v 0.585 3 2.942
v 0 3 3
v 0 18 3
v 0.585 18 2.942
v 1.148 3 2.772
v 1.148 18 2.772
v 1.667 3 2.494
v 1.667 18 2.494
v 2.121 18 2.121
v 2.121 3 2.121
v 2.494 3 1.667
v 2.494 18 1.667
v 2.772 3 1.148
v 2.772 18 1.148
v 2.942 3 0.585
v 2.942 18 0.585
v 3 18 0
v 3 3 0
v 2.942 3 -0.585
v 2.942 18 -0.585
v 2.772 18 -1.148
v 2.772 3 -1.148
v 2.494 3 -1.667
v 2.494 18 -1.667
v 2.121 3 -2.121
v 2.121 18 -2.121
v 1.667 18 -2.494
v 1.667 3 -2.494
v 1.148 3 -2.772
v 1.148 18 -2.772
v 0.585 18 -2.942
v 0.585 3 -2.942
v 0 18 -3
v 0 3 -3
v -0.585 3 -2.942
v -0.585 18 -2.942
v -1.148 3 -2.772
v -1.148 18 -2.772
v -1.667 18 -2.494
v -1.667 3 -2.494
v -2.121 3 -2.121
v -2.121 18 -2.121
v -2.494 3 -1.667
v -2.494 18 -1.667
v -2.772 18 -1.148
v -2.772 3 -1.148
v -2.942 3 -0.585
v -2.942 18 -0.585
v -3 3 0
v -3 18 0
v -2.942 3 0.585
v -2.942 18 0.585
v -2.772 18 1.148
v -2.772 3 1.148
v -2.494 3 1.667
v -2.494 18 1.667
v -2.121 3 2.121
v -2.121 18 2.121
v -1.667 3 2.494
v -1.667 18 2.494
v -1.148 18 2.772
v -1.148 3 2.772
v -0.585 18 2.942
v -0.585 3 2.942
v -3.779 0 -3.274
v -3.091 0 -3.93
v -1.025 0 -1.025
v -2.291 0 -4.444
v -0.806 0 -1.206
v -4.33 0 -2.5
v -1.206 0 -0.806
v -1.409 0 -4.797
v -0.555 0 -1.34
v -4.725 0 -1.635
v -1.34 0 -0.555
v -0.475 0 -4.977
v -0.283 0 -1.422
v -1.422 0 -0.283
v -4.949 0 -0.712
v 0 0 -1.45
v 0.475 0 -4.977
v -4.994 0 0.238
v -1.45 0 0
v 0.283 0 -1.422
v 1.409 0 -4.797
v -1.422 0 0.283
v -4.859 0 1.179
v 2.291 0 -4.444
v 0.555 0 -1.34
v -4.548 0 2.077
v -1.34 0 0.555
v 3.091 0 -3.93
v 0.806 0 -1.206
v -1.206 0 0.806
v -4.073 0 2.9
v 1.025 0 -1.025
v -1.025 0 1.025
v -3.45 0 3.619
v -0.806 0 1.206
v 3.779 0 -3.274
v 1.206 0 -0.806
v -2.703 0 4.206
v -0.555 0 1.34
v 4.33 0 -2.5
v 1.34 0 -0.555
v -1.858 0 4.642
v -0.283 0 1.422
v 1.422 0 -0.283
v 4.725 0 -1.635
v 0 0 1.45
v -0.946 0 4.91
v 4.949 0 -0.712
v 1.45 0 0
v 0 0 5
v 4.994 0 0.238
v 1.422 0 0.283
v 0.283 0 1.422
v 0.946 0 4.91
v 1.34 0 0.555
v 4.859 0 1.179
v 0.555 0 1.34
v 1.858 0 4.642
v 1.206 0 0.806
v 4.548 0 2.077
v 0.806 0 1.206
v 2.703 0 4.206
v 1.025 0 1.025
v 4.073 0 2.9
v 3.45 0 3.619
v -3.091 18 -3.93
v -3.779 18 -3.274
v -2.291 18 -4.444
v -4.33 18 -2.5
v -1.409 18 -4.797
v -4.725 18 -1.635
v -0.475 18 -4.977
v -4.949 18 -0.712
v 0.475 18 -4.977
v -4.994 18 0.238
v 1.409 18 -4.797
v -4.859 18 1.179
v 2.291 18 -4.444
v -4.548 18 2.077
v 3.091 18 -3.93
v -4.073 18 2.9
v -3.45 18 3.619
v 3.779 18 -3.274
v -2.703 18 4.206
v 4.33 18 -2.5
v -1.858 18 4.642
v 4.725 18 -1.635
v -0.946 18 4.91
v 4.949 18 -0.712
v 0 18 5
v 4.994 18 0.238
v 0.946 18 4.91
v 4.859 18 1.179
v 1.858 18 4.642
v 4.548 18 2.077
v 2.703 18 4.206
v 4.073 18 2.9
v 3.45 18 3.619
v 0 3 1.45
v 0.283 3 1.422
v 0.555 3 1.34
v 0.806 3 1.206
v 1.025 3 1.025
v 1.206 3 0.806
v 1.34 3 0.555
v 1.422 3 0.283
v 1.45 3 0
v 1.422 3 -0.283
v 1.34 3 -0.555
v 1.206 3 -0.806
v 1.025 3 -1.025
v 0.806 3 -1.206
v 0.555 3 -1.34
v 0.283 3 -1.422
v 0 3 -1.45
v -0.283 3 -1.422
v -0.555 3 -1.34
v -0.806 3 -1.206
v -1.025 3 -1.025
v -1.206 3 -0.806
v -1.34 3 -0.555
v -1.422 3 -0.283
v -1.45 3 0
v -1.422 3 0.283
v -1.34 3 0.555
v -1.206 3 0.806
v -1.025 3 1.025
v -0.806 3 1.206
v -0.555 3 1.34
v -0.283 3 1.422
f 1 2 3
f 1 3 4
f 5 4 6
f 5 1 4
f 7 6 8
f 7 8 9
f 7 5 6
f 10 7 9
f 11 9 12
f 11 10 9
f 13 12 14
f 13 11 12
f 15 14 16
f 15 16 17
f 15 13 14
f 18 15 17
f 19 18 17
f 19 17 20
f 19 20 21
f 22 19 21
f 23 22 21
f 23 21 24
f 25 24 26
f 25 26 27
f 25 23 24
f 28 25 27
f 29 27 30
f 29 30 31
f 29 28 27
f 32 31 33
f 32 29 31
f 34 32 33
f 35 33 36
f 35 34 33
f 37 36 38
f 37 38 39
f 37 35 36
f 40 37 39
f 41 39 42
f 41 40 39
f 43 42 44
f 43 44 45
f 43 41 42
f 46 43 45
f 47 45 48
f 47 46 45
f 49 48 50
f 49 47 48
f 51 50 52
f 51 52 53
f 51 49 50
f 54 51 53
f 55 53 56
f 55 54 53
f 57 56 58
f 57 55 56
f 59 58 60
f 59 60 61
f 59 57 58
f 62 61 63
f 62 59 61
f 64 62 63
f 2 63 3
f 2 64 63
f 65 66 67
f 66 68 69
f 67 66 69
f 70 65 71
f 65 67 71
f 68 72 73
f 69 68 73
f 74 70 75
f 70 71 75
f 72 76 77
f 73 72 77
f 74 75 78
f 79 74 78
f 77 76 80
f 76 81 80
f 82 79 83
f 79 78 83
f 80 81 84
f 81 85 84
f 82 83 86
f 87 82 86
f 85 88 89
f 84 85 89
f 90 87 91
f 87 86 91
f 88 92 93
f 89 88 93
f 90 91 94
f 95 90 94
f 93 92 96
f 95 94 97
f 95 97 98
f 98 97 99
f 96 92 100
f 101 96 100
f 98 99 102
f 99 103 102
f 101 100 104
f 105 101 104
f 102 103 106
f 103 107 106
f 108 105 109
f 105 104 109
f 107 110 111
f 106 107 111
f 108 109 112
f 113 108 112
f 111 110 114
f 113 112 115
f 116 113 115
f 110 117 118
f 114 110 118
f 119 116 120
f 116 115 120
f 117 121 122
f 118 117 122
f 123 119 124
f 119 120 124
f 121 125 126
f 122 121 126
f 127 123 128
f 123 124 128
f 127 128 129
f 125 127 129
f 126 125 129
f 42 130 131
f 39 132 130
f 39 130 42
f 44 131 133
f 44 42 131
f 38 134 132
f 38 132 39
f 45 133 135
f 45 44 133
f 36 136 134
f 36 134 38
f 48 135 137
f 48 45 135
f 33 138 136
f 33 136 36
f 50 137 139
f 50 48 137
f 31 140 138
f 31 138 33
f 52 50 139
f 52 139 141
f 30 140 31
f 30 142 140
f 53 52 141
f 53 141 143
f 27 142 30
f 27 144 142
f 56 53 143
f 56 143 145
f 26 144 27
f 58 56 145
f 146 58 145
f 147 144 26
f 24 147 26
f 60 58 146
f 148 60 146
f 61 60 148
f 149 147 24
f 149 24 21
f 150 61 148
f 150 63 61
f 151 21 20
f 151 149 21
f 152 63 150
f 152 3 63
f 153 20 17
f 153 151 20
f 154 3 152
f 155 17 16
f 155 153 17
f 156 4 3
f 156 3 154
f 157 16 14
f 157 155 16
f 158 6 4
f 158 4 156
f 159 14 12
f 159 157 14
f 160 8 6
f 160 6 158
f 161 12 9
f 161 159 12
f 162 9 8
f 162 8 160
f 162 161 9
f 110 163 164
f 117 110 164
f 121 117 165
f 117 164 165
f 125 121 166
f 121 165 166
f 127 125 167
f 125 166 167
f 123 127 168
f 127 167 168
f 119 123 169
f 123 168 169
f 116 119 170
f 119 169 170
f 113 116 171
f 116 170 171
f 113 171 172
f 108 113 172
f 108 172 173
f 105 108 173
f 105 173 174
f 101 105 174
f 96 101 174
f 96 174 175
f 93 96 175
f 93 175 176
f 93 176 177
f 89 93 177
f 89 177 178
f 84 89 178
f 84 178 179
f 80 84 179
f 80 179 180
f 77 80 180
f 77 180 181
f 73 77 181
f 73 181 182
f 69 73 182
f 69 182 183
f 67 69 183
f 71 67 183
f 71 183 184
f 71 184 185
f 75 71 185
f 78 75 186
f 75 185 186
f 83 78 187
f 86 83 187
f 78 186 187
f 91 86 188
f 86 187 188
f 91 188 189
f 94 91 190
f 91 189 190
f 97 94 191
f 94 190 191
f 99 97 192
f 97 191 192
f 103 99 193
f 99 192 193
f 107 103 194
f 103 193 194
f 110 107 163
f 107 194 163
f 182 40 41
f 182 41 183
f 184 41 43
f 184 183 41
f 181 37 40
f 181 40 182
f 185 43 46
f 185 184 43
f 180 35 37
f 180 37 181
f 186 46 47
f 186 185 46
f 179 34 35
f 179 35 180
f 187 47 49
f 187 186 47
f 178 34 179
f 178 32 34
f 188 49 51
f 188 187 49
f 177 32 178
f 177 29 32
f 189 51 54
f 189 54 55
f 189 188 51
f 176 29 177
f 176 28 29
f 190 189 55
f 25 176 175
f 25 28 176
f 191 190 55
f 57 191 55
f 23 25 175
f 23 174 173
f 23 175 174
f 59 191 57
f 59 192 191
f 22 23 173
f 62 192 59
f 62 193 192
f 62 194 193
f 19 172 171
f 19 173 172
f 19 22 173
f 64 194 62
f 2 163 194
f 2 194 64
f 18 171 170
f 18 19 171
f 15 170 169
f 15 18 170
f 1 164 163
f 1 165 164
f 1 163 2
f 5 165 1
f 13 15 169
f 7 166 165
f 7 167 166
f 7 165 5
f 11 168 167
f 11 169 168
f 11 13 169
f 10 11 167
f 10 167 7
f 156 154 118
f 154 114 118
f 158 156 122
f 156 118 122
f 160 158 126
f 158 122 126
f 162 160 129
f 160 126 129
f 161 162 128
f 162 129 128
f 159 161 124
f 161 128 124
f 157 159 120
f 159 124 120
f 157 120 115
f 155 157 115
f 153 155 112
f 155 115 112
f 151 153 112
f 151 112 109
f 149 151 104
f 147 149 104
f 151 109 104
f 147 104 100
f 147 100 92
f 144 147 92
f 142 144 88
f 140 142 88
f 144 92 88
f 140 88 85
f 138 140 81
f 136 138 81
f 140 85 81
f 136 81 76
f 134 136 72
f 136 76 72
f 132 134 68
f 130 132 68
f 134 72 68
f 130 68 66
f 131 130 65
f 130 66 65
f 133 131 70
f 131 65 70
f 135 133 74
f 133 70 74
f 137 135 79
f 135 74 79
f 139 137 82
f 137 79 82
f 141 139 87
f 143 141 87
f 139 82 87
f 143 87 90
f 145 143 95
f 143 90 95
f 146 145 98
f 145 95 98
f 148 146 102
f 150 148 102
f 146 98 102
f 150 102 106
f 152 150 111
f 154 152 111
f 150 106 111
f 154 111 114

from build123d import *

# Parameters (mm, degrees)
ESBO_O1_R                     = 5
RESSALTO_EXTRUS_O1_DEPTH      = 3
ESBO_O2_R                     = 5
ESBO_O2_R_2                   = 3
RESSALTO_EXTRUS_O2_DEPTH      = 15
FURO_COM_FOLGA_DE_M2_51_D     = 2.9
FURO_COM_FOLGA_DE_M2_51_DEPTH = 4
FURO_COM_FOLGA_DE_M2_51_TIP   = 0.871247898


with BuildPart() as part:
    # Esboço1 → Ressalto-extrusão1 (new body)
    with BuildSketch(Plane(origin=(0, 0, 0), x_dir=(1, 0, 0), z_dir=(0, 1, 0))):
        with Locations(Location((0, 0, 0), (0, 0, 270))):
            Circle(ESBO_O1_R)
    extrude(amount=RESSALTO_EXTRUS_O1_DEPTH)

    # Esboço2 → Ressalto-extrusão2 (add)
    with BuildSketch(Plane(origin=(0, 3, 0), x_dir=(1, 0, 0), z_dir=(0, 1, 0))):
        with Locations(Location((0, 0, 0), (0, 0, 270))):
            Circle(ESBO_O2_R)
        with Locations(Location((0, 0, 0), (0, 0, 270))):
            Circle(ESBO_O2_R_2, mode=Mode.SUBTRACT)
    extrude(amount=RESSALTO_EXTRUS_O2_DEPTH)

    # Furo com folga de M2.51
    with Locations(Plane(origin=(0, 0, 0), x_dir=(0, 0, -1), z_dir=(0, -1, 0))):
        with Locations((0, 0)):
            Hole(FURO_COM_FOLGA_DE_M2_51_D / 2, depth=FURO_COM_FOLGA_DE_M2_51_DEPTH)
            with Locations((0, 0, -(FURO_COM_FOLGA_DE_M2_51_DEPTH + FURO_COM_FOLGA_DE_M2_51_TIP / 2))):  # 118° drill point
                Cone(0, FURO_COM_FOLGA_DE_M2_51_D / 2, FURO_COM_FOLGA_DE_M2_51_TIP, mode=Mode.SUBTRACT)


solid = part.part
